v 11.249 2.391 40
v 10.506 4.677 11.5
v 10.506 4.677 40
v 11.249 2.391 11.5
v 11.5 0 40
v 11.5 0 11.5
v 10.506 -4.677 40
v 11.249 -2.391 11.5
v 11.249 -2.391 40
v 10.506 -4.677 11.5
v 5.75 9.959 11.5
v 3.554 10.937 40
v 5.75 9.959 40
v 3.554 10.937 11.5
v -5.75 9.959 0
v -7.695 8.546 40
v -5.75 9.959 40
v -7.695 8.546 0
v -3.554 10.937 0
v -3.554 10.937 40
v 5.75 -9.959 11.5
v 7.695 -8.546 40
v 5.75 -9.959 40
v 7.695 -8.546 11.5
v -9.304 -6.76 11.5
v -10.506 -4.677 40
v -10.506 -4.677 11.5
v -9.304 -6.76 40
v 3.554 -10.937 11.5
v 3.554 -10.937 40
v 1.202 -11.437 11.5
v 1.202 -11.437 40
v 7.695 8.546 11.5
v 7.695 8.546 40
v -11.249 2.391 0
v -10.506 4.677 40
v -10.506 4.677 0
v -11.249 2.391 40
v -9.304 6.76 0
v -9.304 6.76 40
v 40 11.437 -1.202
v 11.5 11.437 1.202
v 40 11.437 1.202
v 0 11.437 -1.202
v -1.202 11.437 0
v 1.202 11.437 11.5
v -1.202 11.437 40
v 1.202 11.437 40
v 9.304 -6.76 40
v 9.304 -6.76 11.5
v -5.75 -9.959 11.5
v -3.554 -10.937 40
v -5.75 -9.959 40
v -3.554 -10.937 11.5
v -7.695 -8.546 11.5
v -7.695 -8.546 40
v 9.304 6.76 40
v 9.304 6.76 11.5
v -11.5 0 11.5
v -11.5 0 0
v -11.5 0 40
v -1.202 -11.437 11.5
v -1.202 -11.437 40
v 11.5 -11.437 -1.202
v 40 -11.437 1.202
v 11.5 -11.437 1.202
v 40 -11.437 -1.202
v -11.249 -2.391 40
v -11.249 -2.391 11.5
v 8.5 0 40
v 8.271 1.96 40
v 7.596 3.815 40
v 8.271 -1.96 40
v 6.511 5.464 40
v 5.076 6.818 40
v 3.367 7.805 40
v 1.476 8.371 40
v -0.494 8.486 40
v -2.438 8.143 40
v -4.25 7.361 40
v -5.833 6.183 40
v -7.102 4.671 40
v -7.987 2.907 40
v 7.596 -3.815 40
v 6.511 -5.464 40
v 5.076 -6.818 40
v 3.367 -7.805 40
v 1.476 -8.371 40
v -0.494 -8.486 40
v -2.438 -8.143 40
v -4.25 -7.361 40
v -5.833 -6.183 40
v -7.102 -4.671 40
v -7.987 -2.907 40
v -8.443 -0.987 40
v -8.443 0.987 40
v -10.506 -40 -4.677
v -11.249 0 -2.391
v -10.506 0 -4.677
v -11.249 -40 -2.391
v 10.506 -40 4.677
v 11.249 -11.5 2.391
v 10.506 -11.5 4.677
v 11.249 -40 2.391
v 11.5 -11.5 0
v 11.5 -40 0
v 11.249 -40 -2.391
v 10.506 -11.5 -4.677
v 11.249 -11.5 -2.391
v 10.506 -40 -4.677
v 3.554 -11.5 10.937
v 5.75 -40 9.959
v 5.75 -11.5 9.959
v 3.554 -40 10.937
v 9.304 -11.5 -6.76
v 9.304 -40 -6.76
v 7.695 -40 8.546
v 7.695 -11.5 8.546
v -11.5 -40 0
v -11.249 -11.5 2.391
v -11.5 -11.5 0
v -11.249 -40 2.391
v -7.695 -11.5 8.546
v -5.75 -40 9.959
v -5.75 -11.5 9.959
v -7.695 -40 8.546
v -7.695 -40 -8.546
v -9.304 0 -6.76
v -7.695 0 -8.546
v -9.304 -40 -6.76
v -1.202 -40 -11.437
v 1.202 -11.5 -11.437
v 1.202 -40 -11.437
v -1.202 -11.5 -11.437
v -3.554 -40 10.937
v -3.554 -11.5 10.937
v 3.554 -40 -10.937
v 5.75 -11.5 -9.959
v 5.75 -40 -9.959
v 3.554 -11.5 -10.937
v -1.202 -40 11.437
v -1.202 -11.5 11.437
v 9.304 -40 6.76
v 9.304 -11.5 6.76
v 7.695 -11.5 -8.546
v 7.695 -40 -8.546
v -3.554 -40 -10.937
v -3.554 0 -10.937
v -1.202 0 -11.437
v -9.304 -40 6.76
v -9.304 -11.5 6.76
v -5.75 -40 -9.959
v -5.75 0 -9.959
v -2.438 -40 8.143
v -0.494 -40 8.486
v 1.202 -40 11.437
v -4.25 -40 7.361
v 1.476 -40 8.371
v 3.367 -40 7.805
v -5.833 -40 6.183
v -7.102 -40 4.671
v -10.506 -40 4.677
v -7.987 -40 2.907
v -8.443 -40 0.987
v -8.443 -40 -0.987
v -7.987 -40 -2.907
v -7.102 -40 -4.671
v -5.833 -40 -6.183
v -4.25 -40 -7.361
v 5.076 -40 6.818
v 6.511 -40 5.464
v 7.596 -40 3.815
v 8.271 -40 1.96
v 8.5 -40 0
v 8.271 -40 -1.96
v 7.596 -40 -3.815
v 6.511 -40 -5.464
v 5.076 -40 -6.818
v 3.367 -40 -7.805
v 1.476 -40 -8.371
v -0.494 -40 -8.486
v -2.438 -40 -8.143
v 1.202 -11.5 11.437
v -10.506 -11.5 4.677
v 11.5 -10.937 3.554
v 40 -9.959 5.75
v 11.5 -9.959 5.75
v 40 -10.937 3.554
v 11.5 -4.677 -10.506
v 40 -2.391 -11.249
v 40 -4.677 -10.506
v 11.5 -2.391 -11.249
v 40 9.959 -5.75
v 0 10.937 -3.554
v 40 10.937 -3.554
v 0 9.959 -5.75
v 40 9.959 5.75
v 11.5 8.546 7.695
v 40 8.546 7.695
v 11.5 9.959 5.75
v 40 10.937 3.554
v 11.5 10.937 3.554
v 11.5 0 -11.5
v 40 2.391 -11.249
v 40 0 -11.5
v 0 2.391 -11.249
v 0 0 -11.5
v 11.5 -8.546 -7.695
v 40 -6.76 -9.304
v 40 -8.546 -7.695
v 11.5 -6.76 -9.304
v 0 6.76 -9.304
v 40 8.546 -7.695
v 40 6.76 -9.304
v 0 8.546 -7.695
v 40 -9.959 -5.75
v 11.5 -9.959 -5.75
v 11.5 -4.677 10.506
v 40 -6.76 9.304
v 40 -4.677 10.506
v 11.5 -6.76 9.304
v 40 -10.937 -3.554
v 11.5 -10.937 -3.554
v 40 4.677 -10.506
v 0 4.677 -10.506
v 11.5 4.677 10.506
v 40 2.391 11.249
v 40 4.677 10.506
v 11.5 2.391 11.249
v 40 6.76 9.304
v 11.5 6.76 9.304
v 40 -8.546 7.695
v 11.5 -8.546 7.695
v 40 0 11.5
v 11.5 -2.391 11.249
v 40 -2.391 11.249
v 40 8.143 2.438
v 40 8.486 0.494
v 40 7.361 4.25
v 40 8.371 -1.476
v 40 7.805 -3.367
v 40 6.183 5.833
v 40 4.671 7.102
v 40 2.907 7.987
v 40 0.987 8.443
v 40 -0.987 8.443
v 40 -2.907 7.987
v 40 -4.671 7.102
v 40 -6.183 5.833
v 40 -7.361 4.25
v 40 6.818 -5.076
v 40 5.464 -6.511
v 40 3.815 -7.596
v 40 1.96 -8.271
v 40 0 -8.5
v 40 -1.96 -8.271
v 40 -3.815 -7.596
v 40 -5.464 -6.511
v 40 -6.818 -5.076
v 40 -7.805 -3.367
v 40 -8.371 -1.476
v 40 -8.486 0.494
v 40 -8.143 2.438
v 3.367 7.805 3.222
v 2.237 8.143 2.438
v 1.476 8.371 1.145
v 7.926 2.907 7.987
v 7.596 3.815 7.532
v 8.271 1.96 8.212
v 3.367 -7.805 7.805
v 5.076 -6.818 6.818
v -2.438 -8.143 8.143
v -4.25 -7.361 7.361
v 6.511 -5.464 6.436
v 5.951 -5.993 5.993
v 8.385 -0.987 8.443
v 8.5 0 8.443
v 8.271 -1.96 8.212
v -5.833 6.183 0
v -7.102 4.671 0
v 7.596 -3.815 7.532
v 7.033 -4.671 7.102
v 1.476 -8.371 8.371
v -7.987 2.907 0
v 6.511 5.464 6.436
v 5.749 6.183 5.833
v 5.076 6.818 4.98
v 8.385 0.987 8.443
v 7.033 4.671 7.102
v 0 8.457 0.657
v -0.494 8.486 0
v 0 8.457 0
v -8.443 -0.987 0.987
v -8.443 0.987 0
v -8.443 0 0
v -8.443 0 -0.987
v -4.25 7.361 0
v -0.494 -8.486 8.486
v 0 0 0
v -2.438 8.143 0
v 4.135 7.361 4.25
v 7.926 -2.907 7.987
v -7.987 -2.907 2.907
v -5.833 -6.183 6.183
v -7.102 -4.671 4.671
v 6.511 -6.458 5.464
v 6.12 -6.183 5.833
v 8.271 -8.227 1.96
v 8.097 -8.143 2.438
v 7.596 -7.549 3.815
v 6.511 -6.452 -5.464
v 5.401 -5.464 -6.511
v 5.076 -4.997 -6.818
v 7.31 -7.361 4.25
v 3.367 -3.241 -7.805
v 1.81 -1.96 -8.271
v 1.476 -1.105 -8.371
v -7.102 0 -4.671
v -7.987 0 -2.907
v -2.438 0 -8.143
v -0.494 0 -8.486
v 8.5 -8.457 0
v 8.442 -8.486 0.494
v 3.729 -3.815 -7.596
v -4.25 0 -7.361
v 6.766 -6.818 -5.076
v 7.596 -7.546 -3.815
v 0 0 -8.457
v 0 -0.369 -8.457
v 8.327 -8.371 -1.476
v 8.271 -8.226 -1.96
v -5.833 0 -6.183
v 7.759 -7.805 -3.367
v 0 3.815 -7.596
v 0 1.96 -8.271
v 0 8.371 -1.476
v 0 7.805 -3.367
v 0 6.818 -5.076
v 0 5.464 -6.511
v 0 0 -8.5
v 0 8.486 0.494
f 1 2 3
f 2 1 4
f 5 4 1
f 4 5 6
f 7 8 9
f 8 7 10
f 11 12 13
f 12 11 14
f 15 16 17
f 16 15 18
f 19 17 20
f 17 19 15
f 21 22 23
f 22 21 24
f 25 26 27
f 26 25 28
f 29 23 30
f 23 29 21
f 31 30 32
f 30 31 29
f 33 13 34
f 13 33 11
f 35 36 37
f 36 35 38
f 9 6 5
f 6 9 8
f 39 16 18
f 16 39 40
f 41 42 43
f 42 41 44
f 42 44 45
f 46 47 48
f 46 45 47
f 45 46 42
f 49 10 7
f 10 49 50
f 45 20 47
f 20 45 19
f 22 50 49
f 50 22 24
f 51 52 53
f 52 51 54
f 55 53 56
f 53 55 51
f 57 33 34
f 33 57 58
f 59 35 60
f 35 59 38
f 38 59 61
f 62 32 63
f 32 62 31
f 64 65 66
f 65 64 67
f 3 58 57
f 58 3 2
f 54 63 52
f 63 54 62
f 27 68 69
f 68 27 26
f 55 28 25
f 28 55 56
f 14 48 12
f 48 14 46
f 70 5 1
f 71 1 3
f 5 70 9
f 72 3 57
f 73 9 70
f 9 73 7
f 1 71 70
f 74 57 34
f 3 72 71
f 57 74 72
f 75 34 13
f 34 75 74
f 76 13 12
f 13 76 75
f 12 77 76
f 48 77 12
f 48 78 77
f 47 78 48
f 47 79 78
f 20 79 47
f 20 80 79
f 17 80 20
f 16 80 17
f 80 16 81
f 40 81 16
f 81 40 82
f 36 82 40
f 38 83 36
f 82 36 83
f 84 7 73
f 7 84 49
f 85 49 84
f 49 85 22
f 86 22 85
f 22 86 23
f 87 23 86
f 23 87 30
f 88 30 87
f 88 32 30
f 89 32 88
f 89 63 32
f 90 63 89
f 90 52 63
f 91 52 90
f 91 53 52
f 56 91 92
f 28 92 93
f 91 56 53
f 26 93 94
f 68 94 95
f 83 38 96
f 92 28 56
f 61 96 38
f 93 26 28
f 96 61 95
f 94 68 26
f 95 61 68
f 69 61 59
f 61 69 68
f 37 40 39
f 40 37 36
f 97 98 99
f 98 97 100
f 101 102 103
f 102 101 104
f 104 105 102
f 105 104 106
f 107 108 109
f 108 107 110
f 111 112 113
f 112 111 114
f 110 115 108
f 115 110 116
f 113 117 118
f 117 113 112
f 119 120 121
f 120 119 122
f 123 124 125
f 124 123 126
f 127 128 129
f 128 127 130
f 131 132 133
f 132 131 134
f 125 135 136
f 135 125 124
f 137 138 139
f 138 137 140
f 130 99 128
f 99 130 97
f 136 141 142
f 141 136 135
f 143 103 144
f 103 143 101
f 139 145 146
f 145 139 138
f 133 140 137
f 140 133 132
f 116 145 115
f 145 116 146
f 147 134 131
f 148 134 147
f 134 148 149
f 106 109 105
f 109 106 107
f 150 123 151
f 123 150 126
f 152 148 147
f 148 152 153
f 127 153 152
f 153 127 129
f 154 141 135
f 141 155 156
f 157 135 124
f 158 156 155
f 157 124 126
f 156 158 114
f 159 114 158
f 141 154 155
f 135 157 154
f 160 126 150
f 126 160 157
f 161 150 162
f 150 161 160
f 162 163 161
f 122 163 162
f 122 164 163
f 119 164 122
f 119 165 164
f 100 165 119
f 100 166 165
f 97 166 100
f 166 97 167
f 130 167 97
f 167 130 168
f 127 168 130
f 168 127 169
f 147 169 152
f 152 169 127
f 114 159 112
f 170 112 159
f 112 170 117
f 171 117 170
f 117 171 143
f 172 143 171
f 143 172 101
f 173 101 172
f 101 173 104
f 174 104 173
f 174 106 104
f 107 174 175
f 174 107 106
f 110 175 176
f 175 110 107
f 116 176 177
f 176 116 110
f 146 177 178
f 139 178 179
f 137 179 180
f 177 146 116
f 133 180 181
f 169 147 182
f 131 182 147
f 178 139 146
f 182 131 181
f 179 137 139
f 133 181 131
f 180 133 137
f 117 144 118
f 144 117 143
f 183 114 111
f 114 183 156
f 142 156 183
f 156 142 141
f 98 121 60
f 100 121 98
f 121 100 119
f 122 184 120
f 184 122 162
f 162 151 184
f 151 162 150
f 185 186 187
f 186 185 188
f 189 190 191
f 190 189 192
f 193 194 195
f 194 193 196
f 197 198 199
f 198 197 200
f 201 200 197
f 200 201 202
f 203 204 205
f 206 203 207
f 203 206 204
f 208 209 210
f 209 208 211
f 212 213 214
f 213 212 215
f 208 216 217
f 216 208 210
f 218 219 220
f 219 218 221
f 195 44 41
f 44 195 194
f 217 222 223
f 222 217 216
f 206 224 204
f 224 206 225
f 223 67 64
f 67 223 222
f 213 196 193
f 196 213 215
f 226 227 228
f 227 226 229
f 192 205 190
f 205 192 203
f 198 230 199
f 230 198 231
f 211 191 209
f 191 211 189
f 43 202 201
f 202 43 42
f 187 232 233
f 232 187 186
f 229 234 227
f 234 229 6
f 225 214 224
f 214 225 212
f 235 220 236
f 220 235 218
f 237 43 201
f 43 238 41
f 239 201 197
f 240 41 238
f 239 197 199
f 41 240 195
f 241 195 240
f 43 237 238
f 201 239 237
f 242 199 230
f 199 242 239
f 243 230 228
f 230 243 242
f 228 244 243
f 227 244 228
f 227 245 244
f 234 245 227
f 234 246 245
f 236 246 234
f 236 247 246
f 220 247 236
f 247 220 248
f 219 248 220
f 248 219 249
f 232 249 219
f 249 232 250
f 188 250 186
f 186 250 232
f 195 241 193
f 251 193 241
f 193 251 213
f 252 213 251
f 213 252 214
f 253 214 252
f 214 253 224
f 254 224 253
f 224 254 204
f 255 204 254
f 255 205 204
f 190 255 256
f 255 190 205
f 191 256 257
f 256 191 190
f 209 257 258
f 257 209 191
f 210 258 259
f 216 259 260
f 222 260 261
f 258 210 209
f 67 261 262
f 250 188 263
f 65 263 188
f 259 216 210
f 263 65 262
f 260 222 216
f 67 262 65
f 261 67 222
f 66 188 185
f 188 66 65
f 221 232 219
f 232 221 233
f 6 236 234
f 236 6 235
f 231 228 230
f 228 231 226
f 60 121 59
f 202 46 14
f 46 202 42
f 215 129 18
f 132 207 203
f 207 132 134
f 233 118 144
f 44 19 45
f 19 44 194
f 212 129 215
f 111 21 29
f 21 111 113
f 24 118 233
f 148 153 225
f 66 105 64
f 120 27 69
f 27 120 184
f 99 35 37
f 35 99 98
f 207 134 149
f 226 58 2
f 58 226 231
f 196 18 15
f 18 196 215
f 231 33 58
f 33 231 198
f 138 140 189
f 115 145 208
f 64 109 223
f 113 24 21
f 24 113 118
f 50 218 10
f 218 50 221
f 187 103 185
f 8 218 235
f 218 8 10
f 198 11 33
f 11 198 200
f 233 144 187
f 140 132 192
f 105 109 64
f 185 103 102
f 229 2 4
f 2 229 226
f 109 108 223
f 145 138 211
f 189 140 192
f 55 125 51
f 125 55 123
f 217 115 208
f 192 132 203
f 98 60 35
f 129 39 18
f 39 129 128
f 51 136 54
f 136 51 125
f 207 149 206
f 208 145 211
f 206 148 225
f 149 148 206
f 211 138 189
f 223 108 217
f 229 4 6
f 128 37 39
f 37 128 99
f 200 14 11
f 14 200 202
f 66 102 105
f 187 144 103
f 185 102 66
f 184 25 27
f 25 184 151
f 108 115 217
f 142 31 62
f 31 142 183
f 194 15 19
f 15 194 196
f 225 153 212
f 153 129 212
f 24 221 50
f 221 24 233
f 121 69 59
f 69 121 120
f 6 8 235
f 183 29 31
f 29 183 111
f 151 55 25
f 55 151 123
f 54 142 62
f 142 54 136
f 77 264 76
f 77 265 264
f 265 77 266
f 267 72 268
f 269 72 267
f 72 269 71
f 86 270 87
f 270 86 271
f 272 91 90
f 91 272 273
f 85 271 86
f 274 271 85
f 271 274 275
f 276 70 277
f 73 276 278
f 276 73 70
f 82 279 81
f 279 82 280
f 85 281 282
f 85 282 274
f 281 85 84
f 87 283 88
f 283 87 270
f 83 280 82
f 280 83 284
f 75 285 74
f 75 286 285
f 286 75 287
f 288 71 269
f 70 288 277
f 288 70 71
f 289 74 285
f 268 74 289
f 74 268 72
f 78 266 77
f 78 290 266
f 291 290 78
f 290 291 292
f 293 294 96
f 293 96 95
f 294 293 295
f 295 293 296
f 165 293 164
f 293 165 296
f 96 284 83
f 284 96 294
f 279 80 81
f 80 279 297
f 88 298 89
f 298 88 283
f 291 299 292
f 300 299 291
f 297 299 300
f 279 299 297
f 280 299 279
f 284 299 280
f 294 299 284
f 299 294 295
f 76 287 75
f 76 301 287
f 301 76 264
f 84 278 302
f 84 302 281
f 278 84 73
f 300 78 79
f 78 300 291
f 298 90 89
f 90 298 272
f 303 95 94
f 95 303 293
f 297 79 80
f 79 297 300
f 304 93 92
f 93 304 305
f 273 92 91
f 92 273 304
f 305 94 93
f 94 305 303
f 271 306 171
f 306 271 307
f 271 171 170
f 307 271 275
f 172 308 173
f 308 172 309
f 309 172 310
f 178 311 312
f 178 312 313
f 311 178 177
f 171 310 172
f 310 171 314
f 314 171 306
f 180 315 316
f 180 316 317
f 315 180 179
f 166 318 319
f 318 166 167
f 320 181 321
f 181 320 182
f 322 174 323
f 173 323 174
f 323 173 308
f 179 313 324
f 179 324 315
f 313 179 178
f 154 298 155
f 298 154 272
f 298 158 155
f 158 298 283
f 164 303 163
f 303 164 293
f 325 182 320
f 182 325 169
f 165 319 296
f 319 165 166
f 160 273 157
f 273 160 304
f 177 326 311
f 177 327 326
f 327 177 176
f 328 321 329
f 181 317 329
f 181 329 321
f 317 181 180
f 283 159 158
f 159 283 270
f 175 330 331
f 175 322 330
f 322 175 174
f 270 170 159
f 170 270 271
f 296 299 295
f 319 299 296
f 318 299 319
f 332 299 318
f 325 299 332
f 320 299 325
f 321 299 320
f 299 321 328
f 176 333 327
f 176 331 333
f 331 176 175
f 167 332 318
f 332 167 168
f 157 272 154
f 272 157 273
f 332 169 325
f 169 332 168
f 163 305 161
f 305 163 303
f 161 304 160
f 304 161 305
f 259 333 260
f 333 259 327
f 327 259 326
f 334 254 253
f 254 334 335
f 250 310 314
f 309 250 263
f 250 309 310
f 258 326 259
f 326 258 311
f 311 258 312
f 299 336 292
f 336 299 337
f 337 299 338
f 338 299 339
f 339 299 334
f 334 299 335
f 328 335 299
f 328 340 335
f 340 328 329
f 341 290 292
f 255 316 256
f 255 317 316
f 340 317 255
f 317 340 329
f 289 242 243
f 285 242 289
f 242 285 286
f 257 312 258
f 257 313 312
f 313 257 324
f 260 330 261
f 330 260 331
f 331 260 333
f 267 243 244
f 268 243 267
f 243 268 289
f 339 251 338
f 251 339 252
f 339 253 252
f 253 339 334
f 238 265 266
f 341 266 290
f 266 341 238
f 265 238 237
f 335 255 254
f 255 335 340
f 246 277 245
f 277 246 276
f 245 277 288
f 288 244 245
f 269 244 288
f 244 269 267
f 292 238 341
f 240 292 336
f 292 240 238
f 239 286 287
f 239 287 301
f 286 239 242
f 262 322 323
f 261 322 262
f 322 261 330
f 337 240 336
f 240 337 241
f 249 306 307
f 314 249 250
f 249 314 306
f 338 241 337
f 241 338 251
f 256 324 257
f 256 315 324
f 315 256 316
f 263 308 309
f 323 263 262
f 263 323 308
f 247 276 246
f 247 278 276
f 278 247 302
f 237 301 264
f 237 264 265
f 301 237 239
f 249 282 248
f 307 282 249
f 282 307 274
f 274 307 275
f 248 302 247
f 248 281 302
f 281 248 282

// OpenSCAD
module three_way_connector(diameter, thickness, length, x_y_angle)
{
	outer_radius = (diameter + (thickness * 2)) / 2;
	inner_radius = outer_radius - thickness;

	union() {
		difference() {
			union() {
			    // Outer cylinders
			    translate(0,0,length-diameter/2) cylinder(r = outer_radius, h = length , center = false);
				rotate([x_y_angle, 0, 0]) cylinder(r = outer_radius, h = length, center = false);
				rotate([0, 90, 0]) cylinder(r = outer_radius, h = length, center = false);

				//This is just to cover the gap in the corner in a tidy way
				hull(){
				     translate(0,0,length-diameter/2) cylinder(r = outer_radius, h = outer_radius , center = false);
                     rotate([x_y_angle, 0, 0]) cylinder(r = outer_radius, h = outer_radius, center = false);
                     rotate([0, 90, 0]) cylinder(r = outer_radius, h = outer_radius, center = false);
				}
			}

            // Inner cylinders - to hollow out the outer ones
			translate(0,0,length-diameter/2-1) cylinder(r = inner_radius, h = (length * 2 + 3), center = false);
			rotate([x_y_angle, 0, 0]) cylinder(r = inner_radius, h = (length + 1), center = false);
			rotate([0, 90, 0]) cylinder(r = inner_radius, h = (length + 1), center = false);
		}
	}
}

three_way_connector(17, 3, 40, 90);
